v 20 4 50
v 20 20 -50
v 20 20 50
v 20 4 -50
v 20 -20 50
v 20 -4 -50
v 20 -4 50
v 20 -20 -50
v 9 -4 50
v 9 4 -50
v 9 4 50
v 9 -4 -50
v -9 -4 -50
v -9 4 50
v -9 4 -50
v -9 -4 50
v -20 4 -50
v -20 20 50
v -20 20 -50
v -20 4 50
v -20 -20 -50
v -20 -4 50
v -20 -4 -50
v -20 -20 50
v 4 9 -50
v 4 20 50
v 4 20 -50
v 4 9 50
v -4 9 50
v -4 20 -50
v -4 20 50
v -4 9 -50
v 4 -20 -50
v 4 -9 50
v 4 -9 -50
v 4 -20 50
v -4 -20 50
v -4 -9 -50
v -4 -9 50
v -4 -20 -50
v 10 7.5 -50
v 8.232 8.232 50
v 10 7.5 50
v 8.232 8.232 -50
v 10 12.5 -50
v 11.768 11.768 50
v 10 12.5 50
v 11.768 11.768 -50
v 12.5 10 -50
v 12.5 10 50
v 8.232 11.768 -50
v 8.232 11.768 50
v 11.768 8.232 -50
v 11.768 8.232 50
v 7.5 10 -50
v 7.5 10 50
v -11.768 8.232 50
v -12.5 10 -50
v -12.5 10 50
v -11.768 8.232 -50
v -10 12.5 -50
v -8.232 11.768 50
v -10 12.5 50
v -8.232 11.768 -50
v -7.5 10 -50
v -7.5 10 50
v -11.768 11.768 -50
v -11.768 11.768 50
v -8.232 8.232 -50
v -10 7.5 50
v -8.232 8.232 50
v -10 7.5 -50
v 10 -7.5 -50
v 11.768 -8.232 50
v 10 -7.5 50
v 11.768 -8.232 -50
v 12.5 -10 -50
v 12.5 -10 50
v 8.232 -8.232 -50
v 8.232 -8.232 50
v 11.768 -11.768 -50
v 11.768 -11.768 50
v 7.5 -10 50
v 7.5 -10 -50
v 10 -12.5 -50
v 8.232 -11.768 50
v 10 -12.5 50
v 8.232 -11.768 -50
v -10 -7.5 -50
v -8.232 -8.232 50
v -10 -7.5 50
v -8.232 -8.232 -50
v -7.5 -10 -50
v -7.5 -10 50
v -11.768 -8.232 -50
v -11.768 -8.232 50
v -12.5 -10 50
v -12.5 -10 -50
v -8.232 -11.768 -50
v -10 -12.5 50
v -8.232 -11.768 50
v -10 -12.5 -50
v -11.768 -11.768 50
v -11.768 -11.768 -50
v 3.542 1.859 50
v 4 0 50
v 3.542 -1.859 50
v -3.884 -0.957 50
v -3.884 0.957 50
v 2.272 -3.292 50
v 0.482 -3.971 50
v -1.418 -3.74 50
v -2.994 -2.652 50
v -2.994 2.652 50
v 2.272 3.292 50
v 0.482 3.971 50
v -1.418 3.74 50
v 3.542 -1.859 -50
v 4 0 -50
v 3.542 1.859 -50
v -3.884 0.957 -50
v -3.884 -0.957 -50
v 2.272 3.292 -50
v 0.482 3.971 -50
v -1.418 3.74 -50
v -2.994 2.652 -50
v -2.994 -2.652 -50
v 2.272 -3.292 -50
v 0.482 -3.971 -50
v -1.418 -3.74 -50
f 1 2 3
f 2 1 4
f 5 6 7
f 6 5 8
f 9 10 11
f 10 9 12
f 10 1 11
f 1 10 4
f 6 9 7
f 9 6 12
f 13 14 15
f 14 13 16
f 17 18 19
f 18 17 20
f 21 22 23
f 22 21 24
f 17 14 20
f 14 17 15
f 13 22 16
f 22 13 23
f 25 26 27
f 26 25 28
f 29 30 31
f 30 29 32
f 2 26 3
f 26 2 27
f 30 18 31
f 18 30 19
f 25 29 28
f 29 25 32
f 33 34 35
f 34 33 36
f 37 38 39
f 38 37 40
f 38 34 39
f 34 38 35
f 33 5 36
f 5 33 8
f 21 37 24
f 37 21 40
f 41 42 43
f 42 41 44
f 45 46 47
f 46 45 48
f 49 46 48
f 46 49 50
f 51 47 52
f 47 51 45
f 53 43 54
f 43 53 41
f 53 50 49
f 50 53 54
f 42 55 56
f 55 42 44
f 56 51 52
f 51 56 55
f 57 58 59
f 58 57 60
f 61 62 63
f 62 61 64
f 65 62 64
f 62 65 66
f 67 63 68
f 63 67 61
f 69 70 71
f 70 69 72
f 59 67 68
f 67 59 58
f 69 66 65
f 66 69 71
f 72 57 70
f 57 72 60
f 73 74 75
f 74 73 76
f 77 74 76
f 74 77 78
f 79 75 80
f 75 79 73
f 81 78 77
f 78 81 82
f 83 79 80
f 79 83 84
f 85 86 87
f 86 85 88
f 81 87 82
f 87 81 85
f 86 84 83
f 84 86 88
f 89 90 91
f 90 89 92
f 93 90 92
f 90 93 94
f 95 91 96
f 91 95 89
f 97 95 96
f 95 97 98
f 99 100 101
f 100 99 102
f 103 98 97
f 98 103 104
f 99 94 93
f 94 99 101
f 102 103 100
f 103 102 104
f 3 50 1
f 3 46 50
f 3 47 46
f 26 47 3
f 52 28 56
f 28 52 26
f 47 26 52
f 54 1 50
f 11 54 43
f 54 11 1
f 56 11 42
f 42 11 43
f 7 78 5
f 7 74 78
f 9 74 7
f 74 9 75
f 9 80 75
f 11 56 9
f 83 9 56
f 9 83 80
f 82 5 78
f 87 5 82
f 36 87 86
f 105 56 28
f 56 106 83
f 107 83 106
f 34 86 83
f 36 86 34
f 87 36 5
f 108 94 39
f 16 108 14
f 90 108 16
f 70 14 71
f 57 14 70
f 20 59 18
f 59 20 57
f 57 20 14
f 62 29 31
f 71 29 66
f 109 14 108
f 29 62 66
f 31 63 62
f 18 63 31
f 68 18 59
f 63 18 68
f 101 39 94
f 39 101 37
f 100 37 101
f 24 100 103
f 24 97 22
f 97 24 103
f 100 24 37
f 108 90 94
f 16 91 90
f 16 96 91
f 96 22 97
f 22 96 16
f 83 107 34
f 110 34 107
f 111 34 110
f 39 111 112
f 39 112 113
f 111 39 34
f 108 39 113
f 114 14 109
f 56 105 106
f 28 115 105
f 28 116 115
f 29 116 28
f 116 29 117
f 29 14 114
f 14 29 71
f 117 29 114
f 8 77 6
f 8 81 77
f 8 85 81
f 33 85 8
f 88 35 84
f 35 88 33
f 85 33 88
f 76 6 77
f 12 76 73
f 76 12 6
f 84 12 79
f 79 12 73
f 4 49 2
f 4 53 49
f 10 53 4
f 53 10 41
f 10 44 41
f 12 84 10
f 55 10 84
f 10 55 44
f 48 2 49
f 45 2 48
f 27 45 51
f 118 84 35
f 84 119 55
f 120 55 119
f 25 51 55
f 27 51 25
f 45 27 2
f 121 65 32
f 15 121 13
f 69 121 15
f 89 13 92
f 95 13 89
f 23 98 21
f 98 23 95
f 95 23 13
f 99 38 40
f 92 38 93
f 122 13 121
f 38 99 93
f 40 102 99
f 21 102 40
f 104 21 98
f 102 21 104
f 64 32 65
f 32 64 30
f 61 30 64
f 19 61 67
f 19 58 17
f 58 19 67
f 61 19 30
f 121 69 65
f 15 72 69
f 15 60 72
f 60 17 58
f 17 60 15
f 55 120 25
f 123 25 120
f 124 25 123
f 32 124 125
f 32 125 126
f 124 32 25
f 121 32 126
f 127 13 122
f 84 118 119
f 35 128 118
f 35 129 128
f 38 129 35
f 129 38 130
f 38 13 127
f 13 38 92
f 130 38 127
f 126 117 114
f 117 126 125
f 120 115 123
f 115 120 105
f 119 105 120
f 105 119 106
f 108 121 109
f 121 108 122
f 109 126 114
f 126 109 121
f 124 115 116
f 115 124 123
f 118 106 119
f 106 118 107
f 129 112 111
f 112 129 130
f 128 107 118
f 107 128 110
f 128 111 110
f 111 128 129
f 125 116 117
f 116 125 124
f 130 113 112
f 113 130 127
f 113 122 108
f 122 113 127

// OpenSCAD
// Parameters
cross_section_width = 40; //[20:80:1]
cross_section_height = 40; //[20:80:1]
length = 100; //[50:200:1]
center = 1; //[0:1:1]
cornerHole = 1; //[0:1:1]
wall_thickness = 3; //[1.5:6:0.5]
slot_width = 8; //[4:14:0.5]
slot_depth = 10; //[6:18:0.5]
center_bore_diameter = 8; //[4:16:0.5]
corner_hole_diameter = 5; //[2:10:0.5]
corner_hole_inset = 10; //[6:16:0.5]
overlap = 1; //[0.5:2:0.5]

// Extrusion - complete geometry
module extrusion() {
  color("Silver") {
    difference() {
      // Main body
      cube([cross_section_width, cross_section_height, length], center=true);
      
      // T-slot channels
      union() {
        translate([cross_section_width/2 - (slot_depth + overlap)/2, 0, 0])
          cube([slot_depth + overlap, slot_width, length + 2*overlap], center=true);
        translate([-cross_section_width/2 + (slot_depth + overlap)/2, 0, 0])
          cube([slot_depth + overlap, slot_width, length + 2*overlap], center=true);
        translate([0, cross_section_height/2 - (slot_depth + overlap)/2, 0])
          cube([slot_width, slot_depth + overlap, length + 2*overlap], center=true);
        translate([0, -cross_section_height/2 + (slot_depth + overlap)/2, 0])
          cube([slot_width, slot_depth + overlap, length + 2*overlap], center=true);
      }
      
      // Center bore
      translate([0, 0, 0])
        cylinder(r=center_bore_diameter/2, h=length + 2*overlap, center=true);
      
      // Corner holes
      if (cornerHole) {
        union() {
          translate([cross_section_width/2 - corner_hole_inset, cross_section_height/2 - corner_hole_inset, 0])
            cylinder(r=corner_hole_diameter/2, h=length + 2*overlap, center=true);
          translate([-cross_section_width/2 + corner_hole_inset, cross_section_height/2 - corner_hole_inset, 0])
            cylinder(r=corner_hole_diameter/2, h=length + 2*overlap, center=true);
          translate([cross_section_width/2 - corner_hole_inset, -cross_section_height/2 + corner_hole_inset, 0])
            cylinder(r=corner_hole_diameter/2, h=length + 2*overlap, center=true);
          translate([-cross_section_width/2 + corner_hole_inset, -cross_section_height/2 + corner_hole_inset, 0])
            cylinder(r=corner_hole_diameter/2, h=length + 2*overlap, center=true);
        }
      }
    }
  }
}

// Box Corner Profile Section - complete geometry
module box_corner_profile_section() {
  color("DimGray") {
    union() {
      translate([cross_section_width/2 - wall_thickness/2, cross_section_height/2 - wall_thickness/2, 0])
        cube([wall_thickness, wall_thickness, length], center=true);
      translate([-cross_section_width/2 + wall_thickness/2, cross_section_height/2 - wall_thickness/2, 0])
        cube([wall_thickness, wall_thickness, length], center=true);
      translate([cross_section_width/2 - wall_thickness/2, -cross_section_height/2 + wall_thickness/2, 0])
        cube([wall_thickness, wall_thickness, length], center=true);
      translate([-cross_section_width/2 + wall_thickness/2, -cross_section_height/2 + wall_thickness/2, 0])
        cube([wall_thickness, wall_thickness, length], center=true);
    }
  }
}

// Assembly
module assembly() {
  extrusion();
  box_corner_profile_section();
}

assembly();
